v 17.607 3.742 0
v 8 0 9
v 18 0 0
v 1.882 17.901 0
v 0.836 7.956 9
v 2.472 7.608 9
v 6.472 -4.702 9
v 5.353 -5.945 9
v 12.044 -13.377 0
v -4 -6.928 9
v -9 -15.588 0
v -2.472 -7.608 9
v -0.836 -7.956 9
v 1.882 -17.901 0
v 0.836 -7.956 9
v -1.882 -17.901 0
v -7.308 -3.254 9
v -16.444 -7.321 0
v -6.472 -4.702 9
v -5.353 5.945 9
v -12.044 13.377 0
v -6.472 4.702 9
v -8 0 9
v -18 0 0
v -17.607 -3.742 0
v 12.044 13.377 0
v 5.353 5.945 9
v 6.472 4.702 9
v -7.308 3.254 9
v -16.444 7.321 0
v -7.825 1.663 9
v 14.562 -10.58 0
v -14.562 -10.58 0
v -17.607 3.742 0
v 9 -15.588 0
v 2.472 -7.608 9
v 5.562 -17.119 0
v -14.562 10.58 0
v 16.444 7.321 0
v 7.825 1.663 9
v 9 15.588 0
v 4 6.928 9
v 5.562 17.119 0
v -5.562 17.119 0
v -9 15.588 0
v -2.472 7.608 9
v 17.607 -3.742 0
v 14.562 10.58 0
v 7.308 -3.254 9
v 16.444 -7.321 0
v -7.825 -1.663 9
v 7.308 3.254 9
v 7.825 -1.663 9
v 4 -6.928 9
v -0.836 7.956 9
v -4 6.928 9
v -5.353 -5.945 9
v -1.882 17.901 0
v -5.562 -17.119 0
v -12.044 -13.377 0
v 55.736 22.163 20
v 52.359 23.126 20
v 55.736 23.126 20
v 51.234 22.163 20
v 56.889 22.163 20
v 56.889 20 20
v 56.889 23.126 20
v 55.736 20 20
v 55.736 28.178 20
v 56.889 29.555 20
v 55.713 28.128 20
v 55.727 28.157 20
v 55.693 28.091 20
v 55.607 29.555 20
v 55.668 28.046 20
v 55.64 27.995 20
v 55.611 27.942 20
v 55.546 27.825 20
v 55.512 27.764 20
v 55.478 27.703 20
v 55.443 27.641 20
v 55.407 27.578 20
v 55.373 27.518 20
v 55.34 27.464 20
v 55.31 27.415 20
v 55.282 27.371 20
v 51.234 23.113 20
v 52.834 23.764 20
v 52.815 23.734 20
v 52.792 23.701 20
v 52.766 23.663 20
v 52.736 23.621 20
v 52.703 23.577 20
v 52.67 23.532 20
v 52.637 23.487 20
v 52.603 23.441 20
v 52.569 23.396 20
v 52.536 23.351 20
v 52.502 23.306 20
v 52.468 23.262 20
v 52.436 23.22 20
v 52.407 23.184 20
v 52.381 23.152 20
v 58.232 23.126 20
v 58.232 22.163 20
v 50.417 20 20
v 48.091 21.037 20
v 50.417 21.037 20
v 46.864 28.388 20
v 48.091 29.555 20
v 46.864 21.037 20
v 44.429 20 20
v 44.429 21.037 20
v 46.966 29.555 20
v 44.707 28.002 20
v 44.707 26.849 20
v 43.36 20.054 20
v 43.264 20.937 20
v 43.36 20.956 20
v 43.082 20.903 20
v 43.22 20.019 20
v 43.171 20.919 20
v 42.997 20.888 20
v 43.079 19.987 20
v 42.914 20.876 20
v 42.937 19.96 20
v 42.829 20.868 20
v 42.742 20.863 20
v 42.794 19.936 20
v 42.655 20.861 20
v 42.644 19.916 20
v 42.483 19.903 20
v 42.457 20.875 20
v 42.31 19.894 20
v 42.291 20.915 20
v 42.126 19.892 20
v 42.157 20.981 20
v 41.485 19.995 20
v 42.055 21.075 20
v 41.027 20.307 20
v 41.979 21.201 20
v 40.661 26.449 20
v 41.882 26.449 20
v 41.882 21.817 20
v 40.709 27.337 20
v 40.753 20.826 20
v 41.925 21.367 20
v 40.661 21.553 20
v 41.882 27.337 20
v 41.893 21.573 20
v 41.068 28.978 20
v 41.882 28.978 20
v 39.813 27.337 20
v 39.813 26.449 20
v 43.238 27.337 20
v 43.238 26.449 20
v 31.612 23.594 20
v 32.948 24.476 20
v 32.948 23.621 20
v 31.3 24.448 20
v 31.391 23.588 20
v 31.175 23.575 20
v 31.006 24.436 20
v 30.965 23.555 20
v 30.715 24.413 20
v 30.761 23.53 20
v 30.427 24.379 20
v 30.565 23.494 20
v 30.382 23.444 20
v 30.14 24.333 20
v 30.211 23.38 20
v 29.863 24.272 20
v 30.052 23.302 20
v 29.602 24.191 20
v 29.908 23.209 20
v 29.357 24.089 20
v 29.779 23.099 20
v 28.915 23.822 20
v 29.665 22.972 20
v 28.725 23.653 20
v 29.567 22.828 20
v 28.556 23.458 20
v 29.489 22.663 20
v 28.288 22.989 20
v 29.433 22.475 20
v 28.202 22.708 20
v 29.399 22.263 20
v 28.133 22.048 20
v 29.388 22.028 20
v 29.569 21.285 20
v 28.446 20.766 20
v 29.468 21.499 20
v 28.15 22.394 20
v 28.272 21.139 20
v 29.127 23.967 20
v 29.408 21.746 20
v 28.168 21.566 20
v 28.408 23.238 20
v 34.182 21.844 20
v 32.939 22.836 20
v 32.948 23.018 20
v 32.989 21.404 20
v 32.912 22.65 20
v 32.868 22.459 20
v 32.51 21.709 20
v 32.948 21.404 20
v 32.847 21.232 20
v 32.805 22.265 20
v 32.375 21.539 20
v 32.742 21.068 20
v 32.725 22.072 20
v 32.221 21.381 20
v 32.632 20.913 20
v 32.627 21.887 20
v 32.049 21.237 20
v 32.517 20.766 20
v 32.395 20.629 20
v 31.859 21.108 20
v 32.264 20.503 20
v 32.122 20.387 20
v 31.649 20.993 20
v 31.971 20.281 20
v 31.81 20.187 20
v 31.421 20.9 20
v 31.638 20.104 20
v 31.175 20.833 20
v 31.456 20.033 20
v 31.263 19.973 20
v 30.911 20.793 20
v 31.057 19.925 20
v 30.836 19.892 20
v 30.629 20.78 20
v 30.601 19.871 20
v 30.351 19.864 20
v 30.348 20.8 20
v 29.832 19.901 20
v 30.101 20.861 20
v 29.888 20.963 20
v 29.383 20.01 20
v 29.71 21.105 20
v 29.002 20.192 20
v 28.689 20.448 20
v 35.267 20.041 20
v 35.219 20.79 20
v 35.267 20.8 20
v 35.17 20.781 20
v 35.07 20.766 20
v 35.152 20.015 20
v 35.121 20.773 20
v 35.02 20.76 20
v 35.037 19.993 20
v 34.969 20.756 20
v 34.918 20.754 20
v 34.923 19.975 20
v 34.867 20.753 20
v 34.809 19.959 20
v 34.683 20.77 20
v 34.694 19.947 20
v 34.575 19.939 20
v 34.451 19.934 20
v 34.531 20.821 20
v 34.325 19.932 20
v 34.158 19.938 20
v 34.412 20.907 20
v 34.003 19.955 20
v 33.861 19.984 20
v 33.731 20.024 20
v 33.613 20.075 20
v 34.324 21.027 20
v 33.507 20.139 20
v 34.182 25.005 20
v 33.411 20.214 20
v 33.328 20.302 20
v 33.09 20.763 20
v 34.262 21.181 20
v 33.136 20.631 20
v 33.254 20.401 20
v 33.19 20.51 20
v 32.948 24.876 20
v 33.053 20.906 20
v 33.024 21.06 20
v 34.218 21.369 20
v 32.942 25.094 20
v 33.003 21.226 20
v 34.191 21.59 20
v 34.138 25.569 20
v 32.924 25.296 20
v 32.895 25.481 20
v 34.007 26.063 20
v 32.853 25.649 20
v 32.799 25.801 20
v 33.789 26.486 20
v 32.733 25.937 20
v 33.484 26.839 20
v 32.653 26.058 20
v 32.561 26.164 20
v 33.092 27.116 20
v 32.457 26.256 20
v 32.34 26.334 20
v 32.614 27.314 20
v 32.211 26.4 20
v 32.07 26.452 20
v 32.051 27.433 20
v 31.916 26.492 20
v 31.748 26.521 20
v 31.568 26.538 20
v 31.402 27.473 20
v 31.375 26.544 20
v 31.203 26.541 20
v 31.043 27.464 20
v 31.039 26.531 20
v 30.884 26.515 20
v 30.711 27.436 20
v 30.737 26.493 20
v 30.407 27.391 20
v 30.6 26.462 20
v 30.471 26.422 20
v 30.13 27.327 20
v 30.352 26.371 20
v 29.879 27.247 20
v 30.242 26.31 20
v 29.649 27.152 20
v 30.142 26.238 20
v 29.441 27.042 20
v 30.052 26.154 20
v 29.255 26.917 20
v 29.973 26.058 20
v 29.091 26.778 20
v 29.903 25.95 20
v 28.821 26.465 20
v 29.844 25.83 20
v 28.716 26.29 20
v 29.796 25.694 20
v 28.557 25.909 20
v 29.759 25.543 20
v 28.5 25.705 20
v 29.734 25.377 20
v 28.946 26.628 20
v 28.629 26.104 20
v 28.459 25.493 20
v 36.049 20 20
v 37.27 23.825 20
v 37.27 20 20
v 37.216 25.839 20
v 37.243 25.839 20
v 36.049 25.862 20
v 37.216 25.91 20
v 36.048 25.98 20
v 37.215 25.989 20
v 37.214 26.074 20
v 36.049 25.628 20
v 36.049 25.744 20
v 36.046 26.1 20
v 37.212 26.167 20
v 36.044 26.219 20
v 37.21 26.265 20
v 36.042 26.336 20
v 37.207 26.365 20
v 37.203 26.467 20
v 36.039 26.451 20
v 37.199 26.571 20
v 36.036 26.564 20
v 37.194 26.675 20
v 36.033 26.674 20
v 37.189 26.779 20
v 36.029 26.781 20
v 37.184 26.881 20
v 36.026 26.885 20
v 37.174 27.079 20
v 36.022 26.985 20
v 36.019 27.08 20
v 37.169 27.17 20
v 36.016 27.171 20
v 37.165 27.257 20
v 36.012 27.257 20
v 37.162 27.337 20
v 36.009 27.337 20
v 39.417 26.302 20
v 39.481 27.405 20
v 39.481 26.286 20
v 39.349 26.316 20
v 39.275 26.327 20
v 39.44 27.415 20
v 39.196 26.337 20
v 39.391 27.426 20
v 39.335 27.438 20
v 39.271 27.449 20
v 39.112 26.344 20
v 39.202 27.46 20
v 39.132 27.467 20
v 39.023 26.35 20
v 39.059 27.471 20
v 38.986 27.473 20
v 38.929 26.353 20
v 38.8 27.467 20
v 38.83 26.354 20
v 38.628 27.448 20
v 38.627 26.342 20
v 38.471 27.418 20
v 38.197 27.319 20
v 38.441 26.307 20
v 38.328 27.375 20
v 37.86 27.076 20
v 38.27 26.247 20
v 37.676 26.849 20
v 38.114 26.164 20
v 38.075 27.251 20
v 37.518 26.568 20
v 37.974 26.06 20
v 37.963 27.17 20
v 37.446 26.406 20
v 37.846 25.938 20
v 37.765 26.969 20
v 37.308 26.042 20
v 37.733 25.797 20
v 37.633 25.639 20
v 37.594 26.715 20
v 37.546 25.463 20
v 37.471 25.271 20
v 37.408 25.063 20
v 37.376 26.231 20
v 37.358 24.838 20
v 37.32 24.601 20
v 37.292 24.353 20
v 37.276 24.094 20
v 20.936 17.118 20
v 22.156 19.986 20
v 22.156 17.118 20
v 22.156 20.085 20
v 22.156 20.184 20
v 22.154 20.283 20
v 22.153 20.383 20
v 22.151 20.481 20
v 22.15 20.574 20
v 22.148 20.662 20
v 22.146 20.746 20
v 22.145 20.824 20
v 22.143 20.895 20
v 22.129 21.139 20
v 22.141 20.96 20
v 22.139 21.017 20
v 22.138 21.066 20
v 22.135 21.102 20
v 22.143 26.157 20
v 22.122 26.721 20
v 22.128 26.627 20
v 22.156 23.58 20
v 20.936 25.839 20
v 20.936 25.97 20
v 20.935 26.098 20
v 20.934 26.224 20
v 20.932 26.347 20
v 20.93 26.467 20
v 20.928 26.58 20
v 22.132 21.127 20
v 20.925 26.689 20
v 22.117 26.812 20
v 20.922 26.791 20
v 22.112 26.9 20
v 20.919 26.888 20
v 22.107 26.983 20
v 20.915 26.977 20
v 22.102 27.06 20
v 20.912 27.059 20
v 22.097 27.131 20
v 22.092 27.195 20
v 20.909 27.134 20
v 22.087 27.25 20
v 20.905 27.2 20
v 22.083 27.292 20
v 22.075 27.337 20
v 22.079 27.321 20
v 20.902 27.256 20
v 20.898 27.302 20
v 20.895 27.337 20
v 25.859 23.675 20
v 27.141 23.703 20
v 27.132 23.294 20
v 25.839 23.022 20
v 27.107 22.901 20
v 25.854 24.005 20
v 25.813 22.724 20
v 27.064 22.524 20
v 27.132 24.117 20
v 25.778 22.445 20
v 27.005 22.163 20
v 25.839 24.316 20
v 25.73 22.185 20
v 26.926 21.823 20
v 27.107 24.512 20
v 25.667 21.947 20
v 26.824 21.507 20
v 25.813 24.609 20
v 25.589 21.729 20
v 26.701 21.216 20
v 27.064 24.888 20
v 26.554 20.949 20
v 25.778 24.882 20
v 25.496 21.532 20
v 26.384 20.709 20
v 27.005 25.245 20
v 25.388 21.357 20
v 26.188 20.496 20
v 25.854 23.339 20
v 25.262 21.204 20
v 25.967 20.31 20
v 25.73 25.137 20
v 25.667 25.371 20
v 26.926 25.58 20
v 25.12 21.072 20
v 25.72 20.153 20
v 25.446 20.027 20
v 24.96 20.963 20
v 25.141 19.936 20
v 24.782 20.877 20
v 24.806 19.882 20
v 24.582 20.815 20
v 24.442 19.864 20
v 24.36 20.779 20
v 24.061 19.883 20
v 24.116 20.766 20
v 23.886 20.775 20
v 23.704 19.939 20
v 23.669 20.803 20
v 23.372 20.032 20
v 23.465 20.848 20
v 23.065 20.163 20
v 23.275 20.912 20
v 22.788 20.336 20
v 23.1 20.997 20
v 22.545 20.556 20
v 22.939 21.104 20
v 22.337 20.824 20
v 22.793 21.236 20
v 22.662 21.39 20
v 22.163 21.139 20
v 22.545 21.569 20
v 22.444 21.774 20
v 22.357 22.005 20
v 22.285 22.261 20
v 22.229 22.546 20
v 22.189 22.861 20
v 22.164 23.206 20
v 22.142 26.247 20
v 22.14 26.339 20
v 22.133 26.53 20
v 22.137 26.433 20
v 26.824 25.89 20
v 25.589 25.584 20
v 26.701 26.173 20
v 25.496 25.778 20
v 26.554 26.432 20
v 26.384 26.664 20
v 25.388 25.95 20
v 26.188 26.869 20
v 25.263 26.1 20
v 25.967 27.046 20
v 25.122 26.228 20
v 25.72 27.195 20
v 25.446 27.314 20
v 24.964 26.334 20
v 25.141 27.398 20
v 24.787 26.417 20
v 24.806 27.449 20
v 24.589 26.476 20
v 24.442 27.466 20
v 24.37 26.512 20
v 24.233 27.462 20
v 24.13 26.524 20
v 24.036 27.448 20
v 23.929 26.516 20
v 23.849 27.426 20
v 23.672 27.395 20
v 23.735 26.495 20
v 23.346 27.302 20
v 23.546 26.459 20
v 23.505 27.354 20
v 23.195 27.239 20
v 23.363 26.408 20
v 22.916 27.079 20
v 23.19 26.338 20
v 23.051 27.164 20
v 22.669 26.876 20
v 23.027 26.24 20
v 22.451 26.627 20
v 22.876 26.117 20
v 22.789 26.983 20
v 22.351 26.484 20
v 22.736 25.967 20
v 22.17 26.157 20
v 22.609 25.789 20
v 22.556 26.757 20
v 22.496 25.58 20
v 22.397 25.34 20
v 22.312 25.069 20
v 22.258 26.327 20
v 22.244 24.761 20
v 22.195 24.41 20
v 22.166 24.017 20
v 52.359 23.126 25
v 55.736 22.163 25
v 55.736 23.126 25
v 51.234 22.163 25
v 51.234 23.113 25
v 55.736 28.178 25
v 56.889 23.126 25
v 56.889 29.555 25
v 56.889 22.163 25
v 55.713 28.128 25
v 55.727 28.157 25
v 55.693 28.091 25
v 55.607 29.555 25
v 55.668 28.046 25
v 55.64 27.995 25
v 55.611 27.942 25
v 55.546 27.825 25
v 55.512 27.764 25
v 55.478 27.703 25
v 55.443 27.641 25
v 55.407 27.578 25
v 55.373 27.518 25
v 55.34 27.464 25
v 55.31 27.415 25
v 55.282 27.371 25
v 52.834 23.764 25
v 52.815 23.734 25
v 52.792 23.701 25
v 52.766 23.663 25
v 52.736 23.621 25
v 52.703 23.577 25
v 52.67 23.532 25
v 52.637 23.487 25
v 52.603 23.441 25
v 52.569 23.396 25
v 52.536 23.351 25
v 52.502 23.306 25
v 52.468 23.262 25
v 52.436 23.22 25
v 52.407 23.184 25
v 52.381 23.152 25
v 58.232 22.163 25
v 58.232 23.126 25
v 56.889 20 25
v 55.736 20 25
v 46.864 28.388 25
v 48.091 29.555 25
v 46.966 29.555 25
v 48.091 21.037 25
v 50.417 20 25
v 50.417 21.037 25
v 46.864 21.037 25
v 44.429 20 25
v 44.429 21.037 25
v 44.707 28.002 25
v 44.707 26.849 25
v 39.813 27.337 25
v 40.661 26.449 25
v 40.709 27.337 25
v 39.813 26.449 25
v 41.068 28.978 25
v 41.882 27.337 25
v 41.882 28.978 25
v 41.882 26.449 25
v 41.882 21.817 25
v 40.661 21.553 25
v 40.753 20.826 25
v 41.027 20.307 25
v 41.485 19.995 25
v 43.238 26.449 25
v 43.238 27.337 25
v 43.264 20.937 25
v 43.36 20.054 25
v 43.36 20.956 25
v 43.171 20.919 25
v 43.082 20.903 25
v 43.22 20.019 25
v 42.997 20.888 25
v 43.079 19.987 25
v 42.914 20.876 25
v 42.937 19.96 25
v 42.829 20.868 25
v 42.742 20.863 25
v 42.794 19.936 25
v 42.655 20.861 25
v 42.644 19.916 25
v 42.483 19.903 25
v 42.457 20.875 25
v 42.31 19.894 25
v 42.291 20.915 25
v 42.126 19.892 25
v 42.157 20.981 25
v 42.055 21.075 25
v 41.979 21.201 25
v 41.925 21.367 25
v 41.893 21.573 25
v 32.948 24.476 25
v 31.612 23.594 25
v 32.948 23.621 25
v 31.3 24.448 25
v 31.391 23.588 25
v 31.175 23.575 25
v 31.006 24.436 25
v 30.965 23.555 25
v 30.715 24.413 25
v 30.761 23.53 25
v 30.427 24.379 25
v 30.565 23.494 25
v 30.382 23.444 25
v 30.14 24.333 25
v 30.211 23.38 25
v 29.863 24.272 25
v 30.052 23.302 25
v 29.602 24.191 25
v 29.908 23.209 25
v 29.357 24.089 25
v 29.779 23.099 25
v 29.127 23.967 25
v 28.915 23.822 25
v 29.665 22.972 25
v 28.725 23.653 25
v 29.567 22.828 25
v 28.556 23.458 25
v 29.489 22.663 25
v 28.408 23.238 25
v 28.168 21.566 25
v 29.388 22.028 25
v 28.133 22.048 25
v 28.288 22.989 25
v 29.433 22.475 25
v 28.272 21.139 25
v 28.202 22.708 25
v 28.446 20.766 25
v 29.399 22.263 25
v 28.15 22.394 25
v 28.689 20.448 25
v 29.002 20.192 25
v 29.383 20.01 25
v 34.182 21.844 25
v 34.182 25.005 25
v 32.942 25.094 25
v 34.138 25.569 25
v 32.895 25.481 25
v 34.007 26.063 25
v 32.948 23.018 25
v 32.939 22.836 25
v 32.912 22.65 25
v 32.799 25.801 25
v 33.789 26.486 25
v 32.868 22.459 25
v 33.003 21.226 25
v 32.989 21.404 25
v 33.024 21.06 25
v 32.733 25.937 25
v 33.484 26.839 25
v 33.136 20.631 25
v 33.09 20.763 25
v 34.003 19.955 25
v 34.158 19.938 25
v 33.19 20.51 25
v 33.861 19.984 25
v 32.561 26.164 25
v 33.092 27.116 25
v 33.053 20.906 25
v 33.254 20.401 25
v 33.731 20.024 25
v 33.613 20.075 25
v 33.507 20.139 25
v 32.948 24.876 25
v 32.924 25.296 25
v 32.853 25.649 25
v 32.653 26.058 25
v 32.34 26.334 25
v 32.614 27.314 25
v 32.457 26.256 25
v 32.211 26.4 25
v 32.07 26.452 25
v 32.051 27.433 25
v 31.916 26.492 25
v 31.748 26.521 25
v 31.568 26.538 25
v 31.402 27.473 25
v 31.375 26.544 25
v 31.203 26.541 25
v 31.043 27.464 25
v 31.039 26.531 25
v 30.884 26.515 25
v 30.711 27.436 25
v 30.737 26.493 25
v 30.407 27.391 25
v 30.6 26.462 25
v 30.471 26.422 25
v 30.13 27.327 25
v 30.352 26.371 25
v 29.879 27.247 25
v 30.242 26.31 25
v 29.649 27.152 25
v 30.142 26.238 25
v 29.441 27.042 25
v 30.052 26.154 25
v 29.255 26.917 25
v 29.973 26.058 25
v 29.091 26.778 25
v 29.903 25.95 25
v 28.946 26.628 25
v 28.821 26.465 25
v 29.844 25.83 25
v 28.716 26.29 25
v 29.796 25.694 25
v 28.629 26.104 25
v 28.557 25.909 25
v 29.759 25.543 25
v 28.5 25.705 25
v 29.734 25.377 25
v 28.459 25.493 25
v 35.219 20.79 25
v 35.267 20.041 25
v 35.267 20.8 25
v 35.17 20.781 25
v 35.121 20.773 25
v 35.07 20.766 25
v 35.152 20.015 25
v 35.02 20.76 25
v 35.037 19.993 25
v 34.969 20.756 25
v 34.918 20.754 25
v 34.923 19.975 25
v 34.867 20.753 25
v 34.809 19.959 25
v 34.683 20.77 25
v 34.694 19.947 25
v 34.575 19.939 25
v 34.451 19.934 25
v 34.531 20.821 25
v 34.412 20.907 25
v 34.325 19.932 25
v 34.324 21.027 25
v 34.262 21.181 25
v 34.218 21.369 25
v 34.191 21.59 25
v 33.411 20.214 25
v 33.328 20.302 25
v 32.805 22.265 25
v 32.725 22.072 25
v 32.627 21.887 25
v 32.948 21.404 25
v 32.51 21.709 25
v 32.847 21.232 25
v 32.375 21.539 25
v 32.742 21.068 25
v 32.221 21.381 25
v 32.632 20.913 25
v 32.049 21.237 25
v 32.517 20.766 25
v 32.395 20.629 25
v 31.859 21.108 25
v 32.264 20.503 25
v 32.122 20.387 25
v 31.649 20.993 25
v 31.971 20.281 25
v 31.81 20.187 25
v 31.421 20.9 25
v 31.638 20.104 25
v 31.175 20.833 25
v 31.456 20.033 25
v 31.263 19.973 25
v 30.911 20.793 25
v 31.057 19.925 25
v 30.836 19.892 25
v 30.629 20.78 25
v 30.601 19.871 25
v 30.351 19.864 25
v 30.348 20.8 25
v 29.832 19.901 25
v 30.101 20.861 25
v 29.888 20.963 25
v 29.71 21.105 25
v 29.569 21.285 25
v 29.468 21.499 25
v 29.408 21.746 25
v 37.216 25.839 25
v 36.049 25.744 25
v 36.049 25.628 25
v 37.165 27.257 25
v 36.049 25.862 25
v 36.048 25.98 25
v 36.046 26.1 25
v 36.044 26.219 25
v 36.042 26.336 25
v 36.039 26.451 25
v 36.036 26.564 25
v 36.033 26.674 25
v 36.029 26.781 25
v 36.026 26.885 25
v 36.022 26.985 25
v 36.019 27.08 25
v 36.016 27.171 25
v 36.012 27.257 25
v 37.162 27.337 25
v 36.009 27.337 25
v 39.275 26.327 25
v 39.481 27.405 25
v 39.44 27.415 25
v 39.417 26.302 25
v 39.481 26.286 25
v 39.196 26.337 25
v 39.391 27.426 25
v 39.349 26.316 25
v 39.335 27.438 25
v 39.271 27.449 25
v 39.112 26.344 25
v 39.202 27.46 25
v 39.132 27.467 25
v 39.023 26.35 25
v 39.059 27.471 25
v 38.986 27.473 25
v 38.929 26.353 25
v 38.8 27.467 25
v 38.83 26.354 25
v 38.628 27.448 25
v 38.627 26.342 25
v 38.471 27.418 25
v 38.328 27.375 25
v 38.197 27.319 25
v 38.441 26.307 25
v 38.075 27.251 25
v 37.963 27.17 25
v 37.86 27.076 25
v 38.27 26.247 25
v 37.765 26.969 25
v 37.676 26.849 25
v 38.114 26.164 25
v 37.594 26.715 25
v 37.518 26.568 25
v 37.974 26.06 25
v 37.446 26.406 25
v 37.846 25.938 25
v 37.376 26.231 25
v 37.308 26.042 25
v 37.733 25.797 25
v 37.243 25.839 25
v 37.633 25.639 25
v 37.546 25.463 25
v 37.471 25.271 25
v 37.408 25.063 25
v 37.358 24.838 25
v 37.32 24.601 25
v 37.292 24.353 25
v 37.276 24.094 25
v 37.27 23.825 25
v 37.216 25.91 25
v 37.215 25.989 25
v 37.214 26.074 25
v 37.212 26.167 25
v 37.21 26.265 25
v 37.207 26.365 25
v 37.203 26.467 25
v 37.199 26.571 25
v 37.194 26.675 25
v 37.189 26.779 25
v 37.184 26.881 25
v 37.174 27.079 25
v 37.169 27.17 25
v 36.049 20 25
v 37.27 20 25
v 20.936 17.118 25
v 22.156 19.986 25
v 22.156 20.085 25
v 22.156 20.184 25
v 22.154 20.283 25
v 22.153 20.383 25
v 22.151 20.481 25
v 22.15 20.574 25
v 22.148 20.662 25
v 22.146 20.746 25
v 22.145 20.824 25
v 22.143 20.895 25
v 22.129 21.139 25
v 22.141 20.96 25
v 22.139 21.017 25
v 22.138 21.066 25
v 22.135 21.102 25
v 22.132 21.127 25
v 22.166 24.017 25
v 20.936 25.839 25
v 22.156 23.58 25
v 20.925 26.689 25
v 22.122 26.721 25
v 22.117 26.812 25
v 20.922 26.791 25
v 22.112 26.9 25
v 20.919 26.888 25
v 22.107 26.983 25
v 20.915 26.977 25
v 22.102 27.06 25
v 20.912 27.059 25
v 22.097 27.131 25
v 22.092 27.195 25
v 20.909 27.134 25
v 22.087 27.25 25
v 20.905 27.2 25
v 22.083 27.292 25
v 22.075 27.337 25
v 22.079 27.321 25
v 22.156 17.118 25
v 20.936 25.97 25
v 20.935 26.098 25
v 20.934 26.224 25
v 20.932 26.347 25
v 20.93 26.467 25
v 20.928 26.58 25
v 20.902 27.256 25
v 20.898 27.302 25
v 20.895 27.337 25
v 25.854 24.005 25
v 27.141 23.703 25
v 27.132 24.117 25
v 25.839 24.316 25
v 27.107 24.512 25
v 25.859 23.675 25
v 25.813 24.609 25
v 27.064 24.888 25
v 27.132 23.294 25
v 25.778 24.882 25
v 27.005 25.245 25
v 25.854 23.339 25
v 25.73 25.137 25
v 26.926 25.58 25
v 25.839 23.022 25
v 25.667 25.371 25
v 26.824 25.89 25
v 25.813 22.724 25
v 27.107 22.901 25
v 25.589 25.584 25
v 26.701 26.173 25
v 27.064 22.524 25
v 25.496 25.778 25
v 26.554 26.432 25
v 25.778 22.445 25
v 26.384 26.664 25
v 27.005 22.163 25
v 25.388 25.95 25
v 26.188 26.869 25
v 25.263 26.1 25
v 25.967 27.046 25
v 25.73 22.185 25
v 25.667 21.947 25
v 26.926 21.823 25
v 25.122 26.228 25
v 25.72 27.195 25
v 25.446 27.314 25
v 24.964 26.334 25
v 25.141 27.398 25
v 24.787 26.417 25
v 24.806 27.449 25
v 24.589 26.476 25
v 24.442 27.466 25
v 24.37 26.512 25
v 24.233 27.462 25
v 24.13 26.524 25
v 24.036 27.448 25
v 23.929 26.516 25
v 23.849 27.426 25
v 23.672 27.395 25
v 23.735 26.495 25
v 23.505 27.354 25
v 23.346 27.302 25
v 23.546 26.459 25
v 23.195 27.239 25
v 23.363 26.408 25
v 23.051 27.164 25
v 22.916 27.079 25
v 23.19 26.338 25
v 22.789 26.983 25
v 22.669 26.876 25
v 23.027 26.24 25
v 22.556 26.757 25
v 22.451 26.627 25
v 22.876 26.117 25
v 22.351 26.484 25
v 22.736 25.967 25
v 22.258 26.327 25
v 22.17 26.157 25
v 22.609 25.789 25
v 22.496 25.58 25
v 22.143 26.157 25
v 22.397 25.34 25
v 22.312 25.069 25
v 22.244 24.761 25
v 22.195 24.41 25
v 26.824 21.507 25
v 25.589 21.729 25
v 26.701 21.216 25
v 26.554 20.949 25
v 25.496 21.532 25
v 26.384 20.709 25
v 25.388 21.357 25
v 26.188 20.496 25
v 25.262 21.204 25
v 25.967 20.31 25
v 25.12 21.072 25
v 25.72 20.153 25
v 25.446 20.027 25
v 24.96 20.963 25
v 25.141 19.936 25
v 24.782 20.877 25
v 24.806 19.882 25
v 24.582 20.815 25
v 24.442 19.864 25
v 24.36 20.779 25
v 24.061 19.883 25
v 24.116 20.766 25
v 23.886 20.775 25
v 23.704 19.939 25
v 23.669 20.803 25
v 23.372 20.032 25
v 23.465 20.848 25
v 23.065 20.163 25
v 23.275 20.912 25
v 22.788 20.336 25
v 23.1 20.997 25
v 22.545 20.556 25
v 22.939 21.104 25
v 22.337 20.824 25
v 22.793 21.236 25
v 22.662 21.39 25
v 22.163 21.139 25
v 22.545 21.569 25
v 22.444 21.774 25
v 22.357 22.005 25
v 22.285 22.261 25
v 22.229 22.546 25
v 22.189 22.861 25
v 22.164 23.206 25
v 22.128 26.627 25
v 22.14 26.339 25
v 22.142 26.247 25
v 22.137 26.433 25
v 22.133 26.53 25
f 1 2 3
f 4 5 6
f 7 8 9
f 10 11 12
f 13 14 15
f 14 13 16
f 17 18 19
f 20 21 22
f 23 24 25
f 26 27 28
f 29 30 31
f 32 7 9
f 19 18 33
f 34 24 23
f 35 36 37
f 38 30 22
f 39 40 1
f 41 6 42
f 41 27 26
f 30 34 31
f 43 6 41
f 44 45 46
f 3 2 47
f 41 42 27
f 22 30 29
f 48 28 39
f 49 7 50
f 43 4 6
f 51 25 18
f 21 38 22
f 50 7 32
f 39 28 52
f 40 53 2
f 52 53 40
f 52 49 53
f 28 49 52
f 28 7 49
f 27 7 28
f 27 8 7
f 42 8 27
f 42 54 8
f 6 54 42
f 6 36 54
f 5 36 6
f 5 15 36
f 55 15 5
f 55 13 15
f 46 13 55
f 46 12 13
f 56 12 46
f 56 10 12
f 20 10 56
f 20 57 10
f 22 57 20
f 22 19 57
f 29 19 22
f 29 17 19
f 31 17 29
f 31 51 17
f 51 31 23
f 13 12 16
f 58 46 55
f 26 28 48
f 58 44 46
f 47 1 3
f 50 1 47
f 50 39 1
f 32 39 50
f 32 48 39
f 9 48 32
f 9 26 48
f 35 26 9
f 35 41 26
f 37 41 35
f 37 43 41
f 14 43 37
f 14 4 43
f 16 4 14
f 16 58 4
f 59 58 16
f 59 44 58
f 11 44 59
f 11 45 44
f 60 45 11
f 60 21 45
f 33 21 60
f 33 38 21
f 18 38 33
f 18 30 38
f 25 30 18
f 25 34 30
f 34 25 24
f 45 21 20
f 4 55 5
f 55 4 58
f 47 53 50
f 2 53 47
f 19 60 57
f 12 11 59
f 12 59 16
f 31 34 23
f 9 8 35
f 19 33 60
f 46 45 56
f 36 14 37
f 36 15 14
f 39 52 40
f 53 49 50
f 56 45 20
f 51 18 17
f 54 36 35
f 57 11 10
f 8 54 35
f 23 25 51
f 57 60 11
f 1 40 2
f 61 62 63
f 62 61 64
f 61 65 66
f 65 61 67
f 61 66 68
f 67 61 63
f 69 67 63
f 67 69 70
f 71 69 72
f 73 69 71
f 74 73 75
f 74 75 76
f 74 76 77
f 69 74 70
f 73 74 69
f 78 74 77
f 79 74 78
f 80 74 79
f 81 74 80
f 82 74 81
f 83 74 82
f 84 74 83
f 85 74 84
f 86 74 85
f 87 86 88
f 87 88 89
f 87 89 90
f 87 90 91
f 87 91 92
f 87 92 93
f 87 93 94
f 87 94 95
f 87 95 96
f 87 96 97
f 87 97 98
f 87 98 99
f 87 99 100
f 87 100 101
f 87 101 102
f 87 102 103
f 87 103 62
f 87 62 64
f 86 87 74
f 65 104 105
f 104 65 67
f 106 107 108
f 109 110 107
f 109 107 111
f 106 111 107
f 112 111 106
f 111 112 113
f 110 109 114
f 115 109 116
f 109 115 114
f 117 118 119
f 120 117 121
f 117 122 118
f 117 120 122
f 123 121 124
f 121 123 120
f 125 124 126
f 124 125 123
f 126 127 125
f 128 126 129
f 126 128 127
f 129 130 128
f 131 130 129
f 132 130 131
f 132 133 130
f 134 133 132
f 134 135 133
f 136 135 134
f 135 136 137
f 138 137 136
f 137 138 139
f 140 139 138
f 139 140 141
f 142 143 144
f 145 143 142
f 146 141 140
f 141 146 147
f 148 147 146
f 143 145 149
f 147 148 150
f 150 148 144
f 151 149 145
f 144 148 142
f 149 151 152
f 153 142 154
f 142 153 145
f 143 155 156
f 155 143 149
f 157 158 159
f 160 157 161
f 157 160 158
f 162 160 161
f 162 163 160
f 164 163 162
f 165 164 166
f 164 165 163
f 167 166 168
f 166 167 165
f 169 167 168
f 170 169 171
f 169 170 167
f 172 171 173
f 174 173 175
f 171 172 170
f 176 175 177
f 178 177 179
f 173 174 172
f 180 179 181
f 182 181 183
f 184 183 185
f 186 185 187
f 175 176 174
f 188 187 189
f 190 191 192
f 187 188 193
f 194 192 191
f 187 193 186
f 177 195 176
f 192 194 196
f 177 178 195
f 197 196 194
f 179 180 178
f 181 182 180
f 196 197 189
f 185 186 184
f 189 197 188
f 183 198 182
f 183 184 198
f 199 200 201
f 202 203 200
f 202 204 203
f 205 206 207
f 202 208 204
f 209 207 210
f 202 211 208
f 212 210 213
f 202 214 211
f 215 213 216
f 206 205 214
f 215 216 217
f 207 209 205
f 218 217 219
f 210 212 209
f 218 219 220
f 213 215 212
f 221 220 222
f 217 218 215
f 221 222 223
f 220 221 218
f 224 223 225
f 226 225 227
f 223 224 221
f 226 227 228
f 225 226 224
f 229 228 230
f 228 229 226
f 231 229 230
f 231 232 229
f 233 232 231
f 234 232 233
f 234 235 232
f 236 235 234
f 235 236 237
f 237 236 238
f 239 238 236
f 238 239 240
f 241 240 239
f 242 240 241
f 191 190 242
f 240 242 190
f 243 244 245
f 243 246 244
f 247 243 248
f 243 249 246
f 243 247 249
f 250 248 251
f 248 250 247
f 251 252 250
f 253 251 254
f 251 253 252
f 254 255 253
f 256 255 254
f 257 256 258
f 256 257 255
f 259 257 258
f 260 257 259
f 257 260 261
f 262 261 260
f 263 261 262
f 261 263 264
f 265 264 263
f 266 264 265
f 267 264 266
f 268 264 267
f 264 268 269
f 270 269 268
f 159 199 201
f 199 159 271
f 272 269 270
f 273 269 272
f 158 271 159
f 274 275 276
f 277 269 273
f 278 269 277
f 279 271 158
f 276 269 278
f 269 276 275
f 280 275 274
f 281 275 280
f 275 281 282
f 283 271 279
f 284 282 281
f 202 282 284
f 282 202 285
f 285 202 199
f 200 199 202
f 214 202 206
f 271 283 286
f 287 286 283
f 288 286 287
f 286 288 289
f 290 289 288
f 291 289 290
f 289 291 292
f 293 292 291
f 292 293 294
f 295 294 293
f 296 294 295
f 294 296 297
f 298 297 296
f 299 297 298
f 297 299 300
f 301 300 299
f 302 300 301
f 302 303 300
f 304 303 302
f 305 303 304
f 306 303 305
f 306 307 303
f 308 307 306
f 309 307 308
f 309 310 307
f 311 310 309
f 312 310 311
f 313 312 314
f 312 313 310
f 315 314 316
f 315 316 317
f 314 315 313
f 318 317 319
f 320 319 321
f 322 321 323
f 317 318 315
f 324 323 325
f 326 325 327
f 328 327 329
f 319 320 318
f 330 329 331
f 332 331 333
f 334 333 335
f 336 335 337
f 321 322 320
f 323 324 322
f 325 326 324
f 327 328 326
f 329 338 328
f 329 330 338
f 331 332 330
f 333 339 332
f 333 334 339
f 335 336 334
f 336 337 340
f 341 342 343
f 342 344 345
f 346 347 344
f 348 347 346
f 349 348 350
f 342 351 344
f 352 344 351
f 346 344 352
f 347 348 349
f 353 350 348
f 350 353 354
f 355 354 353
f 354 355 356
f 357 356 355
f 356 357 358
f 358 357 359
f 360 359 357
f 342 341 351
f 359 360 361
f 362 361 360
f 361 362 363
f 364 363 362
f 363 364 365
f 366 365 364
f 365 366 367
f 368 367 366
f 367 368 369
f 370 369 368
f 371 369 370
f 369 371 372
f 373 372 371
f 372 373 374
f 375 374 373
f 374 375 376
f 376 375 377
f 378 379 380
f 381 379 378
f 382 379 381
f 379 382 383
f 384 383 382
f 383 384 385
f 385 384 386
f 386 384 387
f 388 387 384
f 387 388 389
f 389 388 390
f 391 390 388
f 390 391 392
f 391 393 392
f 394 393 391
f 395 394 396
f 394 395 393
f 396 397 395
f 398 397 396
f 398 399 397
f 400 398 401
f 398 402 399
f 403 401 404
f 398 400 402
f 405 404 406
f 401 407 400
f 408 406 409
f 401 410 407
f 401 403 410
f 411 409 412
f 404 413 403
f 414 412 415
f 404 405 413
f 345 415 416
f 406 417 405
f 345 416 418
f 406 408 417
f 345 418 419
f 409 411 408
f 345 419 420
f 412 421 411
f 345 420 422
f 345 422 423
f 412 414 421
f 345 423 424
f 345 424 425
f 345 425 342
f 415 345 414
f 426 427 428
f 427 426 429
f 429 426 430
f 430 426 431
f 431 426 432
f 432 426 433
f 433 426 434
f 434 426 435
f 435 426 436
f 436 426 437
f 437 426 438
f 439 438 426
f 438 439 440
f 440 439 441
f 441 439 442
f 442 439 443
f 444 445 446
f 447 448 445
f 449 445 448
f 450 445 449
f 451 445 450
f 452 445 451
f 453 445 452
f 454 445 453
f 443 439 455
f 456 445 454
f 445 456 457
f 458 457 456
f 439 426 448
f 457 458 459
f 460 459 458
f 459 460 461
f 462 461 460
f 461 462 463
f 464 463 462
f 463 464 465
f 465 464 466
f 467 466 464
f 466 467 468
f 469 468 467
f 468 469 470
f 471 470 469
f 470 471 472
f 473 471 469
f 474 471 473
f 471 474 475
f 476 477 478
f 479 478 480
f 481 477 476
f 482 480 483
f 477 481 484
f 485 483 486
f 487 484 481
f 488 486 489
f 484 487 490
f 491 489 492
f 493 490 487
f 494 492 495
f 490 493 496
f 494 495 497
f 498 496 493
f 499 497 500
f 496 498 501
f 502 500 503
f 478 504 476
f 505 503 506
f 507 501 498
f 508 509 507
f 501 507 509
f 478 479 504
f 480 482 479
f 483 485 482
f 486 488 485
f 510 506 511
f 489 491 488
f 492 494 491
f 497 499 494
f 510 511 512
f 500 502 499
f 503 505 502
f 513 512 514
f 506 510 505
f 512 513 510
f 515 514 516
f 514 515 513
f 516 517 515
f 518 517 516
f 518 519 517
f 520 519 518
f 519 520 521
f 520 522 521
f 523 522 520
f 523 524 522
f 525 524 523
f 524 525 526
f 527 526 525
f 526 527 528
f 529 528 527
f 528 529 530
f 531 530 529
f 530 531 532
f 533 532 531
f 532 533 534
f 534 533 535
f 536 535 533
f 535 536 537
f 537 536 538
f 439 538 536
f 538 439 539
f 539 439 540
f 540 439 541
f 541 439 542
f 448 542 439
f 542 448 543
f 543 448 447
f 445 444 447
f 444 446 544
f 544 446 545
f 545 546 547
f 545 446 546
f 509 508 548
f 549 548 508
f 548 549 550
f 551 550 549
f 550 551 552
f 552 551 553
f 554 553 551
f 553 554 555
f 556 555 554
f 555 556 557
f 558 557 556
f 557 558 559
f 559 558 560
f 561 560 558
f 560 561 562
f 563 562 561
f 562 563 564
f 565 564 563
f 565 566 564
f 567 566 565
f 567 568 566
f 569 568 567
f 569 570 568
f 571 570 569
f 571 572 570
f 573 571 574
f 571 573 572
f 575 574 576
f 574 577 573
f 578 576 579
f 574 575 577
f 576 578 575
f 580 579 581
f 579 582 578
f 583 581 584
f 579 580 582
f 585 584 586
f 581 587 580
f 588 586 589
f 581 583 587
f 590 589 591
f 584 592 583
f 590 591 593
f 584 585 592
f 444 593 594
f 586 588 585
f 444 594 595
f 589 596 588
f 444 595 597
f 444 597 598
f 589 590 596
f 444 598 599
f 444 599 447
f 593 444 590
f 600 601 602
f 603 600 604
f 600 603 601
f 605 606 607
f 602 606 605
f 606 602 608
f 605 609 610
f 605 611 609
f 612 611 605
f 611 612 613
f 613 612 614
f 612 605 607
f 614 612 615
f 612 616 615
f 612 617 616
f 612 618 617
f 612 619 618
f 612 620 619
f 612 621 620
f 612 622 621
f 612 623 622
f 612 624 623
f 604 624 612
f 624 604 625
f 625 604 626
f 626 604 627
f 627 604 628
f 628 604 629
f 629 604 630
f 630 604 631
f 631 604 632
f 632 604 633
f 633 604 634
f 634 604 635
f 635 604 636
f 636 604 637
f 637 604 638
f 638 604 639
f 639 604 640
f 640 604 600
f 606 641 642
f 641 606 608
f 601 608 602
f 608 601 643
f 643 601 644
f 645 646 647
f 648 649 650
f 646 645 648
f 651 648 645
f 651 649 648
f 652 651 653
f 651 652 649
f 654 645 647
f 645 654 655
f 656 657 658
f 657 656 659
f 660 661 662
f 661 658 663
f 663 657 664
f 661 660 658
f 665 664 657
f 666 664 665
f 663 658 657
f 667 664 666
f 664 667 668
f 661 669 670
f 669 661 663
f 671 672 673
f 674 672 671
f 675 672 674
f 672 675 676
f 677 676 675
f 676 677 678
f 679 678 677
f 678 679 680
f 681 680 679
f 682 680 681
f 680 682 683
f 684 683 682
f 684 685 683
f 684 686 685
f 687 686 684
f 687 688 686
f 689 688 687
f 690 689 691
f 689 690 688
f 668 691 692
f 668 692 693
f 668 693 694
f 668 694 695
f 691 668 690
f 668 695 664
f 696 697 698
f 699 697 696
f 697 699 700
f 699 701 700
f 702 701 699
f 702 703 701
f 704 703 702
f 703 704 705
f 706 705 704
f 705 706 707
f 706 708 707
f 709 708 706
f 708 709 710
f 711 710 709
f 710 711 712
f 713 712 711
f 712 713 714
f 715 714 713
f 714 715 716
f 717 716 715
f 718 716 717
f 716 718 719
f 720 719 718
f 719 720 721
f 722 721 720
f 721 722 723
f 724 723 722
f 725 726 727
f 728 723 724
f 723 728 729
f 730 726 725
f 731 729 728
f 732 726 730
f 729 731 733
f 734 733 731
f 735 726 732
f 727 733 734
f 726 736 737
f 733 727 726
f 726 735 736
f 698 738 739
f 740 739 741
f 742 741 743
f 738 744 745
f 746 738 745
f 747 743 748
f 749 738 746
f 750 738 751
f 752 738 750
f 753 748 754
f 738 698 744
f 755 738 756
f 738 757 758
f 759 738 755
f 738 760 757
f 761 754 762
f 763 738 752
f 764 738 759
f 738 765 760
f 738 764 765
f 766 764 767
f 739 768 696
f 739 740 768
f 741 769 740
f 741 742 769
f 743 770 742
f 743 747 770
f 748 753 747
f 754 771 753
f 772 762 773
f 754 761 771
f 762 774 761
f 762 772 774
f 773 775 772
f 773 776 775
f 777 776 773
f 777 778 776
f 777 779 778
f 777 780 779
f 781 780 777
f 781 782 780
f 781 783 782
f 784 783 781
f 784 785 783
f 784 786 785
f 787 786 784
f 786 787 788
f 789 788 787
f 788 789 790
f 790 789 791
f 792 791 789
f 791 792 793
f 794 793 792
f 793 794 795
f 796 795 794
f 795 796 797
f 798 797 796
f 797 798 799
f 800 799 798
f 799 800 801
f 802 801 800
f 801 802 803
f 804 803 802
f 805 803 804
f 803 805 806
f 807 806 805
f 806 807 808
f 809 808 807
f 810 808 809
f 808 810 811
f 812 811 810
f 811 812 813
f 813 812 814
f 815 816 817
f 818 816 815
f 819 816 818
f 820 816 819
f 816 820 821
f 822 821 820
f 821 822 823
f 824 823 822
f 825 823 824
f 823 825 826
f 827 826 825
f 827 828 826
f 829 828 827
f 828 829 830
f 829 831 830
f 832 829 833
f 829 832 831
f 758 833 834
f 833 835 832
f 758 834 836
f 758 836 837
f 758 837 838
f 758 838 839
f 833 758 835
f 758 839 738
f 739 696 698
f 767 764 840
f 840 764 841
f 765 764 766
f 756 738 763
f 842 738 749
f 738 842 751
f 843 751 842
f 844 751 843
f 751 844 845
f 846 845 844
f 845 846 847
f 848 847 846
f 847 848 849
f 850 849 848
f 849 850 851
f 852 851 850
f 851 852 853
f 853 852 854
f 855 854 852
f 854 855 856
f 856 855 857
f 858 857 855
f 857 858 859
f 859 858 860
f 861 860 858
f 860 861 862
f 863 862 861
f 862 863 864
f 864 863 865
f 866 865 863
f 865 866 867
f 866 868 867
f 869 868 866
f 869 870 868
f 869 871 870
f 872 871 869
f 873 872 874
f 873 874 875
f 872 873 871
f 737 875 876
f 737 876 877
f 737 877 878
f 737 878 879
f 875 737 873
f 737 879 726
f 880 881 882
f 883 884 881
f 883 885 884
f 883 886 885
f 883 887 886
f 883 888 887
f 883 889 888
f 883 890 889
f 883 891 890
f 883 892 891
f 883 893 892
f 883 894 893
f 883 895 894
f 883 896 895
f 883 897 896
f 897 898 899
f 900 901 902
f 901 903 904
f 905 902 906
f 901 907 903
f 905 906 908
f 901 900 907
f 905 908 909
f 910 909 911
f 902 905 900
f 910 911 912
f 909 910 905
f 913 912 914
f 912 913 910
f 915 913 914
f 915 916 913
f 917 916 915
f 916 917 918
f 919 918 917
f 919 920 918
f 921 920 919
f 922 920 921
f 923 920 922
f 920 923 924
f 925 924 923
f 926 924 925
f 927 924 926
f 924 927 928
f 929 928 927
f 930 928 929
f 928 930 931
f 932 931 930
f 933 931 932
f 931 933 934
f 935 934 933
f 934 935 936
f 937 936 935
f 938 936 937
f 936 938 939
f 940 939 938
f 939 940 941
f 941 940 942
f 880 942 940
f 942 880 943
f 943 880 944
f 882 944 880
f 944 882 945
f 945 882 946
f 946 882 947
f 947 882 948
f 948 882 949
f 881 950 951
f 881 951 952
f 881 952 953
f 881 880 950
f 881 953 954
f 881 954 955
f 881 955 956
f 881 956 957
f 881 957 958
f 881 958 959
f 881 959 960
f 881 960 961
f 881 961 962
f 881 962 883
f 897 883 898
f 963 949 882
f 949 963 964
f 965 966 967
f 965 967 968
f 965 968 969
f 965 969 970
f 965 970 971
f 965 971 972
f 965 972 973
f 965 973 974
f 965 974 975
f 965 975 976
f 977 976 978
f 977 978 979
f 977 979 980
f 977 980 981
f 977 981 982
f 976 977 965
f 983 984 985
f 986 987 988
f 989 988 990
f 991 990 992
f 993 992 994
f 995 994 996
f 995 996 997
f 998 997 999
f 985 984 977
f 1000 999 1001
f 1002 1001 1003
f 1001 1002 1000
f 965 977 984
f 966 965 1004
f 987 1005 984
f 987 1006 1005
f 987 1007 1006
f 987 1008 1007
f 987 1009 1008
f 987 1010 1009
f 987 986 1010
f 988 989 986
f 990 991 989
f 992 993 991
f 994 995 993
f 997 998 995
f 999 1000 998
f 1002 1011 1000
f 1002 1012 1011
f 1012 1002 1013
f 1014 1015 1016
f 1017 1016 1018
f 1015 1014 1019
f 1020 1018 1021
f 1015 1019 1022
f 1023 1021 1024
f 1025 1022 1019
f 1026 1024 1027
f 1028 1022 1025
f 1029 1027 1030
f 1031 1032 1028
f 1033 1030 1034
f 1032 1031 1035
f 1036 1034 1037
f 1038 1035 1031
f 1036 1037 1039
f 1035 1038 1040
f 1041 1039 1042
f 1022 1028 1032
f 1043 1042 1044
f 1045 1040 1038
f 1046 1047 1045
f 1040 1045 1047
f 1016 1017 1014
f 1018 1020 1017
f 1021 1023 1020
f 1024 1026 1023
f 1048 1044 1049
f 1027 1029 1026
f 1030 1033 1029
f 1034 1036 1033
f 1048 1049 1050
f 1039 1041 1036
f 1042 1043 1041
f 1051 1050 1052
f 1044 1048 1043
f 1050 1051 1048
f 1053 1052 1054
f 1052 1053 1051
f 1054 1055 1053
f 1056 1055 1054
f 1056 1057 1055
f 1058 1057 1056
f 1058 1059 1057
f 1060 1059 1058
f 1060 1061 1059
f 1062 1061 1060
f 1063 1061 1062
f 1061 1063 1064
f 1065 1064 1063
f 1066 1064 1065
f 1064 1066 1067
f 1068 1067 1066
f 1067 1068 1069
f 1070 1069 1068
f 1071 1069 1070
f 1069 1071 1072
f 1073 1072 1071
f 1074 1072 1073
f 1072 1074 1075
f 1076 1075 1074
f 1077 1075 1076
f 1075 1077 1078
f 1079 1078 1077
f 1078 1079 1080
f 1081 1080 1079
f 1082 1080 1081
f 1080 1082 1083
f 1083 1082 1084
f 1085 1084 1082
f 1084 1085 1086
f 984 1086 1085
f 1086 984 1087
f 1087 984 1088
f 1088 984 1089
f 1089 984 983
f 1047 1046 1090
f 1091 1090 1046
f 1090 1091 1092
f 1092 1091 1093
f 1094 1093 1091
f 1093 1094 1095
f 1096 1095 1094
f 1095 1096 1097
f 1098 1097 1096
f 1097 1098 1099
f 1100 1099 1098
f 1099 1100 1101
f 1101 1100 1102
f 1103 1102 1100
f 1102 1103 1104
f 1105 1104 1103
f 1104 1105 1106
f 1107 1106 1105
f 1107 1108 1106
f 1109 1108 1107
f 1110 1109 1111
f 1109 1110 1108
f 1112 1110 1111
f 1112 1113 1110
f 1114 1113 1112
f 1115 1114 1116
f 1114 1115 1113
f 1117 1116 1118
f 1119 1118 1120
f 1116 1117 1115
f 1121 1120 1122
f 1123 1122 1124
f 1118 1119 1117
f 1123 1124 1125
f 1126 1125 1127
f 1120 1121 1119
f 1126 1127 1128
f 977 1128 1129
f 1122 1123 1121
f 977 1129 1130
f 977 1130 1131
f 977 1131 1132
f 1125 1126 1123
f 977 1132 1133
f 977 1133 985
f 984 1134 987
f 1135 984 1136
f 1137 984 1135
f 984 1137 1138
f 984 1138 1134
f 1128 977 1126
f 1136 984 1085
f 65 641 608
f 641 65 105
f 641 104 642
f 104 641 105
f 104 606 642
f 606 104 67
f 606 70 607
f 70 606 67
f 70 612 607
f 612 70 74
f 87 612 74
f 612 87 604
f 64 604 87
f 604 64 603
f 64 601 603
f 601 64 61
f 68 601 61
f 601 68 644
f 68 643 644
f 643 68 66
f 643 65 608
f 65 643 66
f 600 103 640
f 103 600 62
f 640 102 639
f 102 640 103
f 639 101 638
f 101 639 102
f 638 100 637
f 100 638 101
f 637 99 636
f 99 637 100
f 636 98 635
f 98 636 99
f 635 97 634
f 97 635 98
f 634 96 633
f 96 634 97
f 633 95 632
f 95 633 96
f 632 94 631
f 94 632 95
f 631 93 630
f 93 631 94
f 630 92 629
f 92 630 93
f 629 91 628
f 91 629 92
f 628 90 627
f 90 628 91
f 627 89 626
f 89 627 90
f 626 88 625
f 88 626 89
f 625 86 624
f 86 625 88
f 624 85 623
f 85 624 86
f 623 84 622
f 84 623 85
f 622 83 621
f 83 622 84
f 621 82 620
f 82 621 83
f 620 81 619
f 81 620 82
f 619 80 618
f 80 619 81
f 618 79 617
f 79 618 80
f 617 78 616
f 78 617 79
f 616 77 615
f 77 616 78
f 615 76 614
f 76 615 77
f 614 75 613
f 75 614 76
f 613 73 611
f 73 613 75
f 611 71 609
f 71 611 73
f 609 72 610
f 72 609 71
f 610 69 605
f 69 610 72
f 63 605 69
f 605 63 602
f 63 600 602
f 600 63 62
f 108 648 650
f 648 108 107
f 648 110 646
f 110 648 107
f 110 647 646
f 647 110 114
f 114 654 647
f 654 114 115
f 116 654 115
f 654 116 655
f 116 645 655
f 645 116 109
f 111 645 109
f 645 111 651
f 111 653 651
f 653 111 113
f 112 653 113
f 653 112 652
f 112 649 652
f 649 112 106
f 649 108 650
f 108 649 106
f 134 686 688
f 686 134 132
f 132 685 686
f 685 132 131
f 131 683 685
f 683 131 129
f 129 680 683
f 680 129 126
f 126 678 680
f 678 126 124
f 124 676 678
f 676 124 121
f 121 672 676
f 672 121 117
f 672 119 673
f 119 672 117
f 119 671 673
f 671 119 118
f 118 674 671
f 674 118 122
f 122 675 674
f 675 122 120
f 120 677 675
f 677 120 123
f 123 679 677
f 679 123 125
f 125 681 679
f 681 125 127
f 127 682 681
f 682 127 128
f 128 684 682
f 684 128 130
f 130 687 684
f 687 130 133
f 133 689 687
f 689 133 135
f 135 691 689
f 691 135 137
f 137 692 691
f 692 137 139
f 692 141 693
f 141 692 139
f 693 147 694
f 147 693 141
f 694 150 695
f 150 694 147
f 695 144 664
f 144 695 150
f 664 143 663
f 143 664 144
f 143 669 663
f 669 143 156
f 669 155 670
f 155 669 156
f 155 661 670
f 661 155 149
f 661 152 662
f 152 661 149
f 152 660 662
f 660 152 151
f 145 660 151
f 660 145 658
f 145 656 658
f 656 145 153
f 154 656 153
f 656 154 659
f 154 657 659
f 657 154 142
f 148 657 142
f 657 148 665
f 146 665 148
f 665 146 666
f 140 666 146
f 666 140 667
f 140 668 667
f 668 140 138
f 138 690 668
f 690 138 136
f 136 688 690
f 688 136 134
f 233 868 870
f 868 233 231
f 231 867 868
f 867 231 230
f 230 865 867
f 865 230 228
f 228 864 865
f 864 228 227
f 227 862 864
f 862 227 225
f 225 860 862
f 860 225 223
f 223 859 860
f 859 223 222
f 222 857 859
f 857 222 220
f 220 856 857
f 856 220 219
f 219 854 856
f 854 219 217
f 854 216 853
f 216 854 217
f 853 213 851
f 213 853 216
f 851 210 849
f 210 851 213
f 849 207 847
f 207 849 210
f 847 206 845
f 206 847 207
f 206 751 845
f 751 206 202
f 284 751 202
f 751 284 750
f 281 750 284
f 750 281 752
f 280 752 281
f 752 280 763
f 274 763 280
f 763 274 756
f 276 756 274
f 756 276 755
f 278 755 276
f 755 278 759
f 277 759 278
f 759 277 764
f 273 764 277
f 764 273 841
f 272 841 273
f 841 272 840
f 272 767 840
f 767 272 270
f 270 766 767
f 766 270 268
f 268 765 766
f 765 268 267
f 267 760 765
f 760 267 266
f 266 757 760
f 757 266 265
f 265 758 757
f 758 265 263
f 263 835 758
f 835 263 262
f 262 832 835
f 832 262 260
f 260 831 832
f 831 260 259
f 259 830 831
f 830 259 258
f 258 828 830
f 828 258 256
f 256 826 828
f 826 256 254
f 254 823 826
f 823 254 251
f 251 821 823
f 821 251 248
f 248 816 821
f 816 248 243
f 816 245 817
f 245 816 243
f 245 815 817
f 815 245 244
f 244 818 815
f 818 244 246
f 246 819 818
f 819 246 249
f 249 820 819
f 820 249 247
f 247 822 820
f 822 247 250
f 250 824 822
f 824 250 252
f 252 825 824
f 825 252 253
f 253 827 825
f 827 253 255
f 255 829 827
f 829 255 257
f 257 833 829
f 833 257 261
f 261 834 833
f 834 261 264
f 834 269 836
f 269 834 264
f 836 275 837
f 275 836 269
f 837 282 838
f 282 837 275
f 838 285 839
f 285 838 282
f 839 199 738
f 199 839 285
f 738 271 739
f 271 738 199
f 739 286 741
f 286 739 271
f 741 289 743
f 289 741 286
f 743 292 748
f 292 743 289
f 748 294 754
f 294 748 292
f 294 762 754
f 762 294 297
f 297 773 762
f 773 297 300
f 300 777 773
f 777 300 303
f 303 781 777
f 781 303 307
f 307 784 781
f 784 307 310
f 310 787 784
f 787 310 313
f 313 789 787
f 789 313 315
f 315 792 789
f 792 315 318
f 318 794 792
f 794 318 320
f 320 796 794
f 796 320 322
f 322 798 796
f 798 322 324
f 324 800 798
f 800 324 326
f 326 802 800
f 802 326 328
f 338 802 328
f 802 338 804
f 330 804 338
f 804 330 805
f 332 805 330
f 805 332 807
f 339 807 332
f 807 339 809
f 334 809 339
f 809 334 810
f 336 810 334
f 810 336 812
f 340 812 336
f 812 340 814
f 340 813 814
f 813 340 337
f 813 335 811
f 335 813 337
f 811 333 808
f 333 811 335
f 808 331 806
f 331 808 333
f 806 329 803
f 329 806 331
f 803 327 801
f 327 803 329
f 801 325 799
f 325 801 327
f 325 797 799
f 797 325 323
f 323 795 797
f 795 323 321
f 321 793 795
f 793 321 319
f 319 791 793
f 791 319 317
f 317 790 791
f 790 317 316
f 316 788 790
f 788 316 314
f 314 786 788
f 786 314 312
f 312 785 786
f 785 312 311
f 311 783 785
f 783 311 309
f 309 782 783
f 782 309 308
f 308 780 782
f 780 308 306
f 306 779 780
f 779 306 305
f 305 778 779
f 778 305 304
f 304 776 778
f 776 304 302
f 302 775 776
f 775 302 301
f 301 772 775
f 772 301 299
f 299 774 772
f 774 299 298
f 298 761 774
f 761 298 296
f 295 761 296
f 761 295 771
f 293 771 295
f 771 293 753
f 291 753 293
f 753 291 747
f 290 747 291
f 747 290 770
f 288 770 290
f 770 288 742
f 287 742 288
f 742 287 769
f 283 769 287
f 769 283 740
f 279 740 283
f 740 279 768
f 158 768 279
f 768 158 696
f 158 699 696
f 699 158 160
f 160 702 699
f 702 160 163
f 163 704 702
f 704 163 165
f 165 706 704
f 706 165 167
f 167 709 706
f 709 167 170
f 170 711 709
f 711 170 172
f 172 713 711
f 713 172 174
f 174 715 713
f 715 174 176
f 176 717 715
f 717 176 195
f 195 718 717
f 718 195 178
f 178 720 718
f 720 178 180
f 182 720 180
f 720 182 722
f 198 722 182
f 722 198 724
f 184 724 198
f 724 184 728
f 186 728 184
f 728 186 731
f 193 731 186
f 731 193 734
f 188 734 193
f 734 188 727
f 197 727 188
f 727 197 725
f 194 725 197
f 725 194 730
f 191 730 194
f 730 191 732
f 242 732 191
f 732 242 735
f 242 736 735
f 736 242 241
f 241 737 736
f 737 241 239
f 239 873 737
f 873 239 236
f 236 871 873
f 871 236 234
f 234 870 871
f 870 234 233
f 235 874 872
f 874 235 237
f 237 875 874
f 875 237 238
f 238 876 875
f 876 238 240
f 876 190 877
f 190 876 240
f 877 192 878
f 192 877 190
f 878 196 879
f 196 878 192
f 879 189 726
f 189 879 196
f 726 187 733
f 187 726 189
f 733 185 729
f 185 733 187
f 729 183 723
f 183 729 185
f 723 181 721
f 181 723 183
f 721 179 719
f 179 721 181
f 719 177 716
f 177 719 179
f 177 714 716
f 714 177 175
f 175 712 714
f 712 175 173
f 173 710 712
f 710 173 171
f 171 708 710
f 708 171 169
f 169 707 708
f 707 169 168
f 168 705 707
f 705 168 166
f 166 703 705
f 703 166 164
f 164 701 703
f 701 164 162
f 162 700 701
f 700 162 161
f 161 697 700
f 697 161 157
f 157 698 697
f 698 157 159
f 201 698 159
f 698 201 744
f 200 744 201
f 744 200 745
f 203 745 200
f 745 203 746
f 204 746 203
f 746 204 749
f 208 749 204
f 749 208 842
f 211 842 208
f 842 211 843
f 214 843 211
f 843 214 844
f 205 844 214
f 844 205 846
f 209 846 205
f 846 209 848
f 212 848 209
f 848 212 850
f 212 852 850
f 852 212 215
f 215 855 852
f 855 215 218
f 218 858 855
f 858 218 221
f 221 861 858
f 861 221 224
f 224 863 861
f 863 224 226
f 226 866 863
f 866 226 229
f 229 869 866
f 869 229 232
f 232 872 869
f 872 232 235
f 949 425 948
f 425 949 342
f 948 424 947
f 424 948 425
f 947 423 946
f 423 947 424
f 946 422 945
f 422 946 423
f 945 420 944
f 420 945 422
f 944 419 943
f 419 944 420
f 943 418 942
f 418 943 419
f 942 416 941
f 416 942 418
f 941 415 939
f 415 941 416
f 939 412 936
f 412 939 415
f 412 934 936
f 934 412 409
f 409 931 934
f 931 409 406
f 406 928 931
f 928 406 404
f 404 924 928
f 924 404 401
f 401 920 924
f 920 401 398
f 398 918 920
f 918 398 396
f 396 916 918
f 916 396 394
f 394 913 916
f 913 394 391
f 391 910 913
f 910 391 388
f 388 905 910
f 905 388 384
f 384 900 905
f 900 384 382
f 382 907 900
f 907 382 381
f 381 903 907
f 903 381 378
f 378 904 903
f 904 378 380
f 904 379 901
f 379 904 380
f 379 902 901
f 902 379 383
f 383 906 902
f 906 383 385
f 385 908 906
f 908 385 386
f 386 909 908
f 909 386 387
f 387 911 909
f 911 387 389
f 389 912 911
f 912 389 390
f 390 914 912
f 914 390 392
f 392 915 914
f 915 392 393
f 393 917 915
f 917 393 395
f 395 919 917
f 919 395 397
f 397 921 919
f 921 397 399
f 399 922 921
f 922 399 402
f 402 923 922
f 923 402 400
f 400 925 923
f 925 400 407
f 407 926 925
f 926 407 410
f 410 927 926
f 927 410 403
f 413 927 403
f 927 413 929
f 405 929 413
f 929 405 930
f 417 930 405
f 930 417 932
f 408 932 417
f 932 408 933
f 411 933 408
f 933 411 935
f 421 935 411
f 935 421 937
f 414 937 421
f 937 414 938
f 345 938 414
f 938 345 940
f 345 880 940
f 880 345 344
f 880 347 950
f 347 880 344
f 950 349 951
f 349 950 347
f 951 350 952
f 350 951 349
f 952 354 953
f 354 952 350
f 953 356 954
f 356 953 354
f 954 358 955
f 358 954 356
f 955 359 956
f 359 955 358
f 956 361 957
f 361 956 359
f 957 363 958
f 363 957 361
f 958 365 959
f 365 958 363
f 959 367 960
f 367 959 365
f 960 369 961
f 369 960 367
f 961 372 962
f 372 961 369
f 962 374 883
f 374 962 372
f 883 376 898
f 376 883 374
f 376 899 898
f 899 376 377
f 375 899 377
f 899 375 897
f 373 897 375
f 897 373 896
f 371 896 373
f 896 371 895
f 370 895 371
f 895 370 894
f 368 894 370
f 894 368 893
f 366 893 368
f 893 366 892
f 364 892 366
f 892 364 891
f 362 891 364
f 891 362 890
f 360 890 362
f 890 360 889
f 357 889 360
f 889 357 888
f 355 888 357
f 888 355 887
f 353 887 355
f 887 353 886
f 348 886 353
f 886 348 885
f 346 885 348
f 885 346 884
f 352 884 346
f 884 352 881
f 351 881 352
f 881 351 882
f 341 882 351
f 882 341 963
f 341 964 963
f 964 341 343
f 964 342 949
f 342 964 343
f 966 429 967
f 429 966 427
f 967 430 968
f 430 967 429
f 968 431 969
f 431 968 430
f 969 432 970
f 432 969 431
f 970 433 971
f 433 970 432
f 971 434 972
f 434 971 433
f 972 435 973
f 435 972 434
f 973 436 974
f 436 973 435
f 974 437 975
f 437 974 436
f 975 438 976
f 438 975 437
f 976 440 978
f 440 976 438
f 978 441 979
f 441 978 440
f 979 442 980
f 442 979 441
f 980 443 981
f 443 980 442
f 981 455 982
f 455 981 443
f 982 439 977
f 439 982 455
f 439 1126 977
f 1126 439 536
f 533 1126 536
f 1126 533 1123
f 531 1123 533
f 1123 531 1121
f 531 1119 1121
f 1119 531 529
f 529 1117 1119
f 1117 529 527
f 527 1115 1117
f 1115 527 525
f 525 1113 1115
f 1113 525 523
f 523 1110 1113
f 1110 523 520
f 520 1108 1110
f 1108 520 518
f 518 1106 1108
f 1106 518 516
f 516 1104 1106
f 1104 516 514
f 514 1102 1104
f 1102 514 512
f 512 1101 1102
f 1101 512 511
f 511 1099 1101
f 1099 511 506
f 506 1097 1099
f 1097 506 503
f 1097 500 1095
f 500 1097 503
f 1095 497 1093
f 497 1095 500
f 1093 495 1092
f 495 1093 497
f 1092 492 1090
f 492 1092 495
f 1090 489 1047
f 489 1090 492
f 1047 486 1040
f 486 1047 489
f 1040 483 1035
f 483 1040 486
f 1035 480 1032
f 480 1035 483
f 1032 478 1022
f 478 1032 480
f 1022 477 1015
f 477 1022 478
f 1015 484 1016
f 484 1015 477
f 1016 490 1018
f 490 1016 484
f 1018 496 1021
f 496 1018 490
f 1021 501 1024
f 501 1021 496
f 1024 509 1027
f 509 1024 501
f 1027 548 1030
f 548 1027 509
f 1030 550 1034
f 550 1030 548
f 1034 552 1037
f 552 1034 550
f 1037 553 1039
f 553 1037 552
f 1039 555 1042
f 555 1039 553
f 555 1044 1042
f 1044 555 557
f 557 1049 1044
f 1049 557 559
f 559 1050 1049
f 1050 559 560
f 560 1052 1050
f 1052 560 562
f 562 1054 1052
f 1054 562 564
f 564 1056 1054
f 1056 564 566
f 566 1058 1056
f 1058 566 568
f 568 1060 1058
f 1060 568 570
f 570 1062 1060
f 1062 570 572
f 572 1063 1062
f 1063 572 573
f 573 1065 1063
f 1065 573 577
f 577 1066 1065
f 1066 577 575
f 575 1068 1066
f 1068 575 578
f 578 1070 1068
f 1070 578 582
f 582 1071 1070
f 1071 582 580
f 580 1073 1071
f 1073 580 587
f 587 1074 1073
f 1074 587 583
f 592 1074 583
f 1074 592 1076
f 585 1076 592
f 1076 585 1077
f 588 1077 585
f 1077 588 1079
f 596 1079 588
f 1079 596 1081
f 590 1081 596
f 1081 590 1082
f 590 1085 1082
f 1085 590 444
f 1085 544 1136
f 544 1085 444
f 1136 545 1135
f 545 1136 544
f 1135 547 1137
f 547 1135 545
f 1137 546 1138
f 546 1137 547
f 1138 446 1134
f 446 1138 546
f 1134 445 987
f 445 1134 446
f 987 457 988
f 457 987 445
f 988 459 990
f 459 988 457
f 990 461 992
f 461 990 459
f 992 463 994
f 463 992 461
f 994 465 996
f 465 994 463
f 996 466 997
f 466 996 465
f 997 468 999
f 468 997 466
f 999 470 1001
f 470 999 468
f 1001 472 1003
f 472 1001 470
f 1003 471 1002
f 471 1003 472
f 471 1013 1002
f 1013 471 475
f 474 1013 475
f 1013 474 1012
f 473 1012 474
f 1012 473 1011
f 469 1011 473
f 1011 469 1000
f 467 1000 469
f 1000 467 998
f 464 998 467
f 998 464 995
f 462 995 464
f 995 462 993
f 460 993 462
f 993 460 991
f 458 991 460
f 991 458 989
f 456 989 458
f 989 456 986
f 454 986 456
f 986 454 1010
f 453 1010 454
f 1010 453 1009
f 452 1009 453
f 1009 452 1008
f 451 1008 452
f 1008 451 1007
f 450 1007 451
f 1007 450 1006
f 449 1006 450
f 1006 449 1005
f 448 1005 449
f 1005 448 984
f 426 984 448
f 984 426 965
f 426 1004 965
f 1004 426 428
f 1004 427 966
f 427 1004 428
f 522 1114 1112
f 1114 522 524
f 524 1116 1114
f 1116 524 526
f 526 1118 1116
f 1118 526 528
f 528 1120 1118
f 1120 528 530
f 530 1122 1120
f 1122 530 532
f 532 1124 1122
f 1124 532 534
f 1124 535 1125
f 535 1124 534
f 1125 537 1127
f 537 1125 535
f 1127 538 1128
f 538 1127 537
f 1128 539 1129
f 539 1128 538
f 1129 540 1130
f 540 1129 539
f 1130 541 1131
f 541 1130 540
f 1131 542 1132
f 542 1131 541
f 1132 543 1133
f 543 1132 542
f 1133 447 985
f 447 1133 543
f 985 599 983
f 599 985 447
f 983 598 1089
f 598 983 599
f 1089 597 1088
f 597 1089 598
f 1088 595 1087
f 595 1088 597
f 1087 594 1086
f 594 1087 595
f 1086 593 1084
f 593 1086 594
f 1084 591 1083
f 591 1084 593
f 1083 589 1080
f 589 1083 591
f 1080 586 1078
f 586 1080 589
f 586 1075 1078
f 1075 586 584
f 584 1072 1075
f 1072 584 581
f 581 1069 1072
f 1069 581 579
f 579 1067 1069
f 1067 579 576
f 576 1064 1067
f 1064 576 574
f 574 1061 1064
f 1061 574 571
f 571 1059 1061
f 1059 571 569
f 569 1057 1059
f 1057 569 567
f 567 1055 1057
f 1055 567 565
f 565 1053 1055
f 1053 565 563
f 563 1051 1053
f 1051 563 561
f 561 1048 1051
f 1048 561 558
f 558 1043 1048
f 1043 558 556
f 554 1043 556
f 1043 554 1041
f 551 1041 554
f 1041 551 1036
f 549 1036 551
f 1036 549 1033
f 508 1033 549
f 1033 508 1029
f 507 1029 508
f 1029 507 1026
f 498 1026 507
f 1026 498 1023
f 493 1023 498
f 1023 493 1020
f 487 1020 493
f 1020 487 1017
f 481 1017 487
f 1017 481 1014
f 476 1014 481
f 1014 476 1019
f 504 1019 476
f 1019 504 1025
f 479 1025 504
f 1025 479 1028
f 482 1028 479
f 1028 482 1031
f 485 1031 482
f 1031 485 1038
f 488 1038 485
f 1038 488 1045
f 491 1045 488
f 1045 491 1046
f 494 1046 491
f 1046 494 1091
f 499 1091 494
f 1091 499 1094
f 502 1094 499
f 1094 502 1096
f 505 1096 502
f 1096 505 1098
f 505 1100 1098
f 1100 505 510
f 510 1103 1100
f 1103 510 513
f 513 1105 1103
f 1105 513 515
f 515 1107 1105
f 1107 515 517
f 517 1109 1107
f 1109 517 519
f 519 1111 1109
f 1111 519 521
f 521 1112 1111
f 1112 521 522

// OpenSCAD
//[CUSTOMIZATION]
// Height
h=9;
// Radius 1
r1=18;
// Radius 2
r2=8;
// Message
txt="part14";
module __END_CUSTOMIZATIONS () { }
cylinder(h,r1,r2);
translate([20,20,20]) { linear_extrude(5) text(txt, font="Liberation Sans"); }
